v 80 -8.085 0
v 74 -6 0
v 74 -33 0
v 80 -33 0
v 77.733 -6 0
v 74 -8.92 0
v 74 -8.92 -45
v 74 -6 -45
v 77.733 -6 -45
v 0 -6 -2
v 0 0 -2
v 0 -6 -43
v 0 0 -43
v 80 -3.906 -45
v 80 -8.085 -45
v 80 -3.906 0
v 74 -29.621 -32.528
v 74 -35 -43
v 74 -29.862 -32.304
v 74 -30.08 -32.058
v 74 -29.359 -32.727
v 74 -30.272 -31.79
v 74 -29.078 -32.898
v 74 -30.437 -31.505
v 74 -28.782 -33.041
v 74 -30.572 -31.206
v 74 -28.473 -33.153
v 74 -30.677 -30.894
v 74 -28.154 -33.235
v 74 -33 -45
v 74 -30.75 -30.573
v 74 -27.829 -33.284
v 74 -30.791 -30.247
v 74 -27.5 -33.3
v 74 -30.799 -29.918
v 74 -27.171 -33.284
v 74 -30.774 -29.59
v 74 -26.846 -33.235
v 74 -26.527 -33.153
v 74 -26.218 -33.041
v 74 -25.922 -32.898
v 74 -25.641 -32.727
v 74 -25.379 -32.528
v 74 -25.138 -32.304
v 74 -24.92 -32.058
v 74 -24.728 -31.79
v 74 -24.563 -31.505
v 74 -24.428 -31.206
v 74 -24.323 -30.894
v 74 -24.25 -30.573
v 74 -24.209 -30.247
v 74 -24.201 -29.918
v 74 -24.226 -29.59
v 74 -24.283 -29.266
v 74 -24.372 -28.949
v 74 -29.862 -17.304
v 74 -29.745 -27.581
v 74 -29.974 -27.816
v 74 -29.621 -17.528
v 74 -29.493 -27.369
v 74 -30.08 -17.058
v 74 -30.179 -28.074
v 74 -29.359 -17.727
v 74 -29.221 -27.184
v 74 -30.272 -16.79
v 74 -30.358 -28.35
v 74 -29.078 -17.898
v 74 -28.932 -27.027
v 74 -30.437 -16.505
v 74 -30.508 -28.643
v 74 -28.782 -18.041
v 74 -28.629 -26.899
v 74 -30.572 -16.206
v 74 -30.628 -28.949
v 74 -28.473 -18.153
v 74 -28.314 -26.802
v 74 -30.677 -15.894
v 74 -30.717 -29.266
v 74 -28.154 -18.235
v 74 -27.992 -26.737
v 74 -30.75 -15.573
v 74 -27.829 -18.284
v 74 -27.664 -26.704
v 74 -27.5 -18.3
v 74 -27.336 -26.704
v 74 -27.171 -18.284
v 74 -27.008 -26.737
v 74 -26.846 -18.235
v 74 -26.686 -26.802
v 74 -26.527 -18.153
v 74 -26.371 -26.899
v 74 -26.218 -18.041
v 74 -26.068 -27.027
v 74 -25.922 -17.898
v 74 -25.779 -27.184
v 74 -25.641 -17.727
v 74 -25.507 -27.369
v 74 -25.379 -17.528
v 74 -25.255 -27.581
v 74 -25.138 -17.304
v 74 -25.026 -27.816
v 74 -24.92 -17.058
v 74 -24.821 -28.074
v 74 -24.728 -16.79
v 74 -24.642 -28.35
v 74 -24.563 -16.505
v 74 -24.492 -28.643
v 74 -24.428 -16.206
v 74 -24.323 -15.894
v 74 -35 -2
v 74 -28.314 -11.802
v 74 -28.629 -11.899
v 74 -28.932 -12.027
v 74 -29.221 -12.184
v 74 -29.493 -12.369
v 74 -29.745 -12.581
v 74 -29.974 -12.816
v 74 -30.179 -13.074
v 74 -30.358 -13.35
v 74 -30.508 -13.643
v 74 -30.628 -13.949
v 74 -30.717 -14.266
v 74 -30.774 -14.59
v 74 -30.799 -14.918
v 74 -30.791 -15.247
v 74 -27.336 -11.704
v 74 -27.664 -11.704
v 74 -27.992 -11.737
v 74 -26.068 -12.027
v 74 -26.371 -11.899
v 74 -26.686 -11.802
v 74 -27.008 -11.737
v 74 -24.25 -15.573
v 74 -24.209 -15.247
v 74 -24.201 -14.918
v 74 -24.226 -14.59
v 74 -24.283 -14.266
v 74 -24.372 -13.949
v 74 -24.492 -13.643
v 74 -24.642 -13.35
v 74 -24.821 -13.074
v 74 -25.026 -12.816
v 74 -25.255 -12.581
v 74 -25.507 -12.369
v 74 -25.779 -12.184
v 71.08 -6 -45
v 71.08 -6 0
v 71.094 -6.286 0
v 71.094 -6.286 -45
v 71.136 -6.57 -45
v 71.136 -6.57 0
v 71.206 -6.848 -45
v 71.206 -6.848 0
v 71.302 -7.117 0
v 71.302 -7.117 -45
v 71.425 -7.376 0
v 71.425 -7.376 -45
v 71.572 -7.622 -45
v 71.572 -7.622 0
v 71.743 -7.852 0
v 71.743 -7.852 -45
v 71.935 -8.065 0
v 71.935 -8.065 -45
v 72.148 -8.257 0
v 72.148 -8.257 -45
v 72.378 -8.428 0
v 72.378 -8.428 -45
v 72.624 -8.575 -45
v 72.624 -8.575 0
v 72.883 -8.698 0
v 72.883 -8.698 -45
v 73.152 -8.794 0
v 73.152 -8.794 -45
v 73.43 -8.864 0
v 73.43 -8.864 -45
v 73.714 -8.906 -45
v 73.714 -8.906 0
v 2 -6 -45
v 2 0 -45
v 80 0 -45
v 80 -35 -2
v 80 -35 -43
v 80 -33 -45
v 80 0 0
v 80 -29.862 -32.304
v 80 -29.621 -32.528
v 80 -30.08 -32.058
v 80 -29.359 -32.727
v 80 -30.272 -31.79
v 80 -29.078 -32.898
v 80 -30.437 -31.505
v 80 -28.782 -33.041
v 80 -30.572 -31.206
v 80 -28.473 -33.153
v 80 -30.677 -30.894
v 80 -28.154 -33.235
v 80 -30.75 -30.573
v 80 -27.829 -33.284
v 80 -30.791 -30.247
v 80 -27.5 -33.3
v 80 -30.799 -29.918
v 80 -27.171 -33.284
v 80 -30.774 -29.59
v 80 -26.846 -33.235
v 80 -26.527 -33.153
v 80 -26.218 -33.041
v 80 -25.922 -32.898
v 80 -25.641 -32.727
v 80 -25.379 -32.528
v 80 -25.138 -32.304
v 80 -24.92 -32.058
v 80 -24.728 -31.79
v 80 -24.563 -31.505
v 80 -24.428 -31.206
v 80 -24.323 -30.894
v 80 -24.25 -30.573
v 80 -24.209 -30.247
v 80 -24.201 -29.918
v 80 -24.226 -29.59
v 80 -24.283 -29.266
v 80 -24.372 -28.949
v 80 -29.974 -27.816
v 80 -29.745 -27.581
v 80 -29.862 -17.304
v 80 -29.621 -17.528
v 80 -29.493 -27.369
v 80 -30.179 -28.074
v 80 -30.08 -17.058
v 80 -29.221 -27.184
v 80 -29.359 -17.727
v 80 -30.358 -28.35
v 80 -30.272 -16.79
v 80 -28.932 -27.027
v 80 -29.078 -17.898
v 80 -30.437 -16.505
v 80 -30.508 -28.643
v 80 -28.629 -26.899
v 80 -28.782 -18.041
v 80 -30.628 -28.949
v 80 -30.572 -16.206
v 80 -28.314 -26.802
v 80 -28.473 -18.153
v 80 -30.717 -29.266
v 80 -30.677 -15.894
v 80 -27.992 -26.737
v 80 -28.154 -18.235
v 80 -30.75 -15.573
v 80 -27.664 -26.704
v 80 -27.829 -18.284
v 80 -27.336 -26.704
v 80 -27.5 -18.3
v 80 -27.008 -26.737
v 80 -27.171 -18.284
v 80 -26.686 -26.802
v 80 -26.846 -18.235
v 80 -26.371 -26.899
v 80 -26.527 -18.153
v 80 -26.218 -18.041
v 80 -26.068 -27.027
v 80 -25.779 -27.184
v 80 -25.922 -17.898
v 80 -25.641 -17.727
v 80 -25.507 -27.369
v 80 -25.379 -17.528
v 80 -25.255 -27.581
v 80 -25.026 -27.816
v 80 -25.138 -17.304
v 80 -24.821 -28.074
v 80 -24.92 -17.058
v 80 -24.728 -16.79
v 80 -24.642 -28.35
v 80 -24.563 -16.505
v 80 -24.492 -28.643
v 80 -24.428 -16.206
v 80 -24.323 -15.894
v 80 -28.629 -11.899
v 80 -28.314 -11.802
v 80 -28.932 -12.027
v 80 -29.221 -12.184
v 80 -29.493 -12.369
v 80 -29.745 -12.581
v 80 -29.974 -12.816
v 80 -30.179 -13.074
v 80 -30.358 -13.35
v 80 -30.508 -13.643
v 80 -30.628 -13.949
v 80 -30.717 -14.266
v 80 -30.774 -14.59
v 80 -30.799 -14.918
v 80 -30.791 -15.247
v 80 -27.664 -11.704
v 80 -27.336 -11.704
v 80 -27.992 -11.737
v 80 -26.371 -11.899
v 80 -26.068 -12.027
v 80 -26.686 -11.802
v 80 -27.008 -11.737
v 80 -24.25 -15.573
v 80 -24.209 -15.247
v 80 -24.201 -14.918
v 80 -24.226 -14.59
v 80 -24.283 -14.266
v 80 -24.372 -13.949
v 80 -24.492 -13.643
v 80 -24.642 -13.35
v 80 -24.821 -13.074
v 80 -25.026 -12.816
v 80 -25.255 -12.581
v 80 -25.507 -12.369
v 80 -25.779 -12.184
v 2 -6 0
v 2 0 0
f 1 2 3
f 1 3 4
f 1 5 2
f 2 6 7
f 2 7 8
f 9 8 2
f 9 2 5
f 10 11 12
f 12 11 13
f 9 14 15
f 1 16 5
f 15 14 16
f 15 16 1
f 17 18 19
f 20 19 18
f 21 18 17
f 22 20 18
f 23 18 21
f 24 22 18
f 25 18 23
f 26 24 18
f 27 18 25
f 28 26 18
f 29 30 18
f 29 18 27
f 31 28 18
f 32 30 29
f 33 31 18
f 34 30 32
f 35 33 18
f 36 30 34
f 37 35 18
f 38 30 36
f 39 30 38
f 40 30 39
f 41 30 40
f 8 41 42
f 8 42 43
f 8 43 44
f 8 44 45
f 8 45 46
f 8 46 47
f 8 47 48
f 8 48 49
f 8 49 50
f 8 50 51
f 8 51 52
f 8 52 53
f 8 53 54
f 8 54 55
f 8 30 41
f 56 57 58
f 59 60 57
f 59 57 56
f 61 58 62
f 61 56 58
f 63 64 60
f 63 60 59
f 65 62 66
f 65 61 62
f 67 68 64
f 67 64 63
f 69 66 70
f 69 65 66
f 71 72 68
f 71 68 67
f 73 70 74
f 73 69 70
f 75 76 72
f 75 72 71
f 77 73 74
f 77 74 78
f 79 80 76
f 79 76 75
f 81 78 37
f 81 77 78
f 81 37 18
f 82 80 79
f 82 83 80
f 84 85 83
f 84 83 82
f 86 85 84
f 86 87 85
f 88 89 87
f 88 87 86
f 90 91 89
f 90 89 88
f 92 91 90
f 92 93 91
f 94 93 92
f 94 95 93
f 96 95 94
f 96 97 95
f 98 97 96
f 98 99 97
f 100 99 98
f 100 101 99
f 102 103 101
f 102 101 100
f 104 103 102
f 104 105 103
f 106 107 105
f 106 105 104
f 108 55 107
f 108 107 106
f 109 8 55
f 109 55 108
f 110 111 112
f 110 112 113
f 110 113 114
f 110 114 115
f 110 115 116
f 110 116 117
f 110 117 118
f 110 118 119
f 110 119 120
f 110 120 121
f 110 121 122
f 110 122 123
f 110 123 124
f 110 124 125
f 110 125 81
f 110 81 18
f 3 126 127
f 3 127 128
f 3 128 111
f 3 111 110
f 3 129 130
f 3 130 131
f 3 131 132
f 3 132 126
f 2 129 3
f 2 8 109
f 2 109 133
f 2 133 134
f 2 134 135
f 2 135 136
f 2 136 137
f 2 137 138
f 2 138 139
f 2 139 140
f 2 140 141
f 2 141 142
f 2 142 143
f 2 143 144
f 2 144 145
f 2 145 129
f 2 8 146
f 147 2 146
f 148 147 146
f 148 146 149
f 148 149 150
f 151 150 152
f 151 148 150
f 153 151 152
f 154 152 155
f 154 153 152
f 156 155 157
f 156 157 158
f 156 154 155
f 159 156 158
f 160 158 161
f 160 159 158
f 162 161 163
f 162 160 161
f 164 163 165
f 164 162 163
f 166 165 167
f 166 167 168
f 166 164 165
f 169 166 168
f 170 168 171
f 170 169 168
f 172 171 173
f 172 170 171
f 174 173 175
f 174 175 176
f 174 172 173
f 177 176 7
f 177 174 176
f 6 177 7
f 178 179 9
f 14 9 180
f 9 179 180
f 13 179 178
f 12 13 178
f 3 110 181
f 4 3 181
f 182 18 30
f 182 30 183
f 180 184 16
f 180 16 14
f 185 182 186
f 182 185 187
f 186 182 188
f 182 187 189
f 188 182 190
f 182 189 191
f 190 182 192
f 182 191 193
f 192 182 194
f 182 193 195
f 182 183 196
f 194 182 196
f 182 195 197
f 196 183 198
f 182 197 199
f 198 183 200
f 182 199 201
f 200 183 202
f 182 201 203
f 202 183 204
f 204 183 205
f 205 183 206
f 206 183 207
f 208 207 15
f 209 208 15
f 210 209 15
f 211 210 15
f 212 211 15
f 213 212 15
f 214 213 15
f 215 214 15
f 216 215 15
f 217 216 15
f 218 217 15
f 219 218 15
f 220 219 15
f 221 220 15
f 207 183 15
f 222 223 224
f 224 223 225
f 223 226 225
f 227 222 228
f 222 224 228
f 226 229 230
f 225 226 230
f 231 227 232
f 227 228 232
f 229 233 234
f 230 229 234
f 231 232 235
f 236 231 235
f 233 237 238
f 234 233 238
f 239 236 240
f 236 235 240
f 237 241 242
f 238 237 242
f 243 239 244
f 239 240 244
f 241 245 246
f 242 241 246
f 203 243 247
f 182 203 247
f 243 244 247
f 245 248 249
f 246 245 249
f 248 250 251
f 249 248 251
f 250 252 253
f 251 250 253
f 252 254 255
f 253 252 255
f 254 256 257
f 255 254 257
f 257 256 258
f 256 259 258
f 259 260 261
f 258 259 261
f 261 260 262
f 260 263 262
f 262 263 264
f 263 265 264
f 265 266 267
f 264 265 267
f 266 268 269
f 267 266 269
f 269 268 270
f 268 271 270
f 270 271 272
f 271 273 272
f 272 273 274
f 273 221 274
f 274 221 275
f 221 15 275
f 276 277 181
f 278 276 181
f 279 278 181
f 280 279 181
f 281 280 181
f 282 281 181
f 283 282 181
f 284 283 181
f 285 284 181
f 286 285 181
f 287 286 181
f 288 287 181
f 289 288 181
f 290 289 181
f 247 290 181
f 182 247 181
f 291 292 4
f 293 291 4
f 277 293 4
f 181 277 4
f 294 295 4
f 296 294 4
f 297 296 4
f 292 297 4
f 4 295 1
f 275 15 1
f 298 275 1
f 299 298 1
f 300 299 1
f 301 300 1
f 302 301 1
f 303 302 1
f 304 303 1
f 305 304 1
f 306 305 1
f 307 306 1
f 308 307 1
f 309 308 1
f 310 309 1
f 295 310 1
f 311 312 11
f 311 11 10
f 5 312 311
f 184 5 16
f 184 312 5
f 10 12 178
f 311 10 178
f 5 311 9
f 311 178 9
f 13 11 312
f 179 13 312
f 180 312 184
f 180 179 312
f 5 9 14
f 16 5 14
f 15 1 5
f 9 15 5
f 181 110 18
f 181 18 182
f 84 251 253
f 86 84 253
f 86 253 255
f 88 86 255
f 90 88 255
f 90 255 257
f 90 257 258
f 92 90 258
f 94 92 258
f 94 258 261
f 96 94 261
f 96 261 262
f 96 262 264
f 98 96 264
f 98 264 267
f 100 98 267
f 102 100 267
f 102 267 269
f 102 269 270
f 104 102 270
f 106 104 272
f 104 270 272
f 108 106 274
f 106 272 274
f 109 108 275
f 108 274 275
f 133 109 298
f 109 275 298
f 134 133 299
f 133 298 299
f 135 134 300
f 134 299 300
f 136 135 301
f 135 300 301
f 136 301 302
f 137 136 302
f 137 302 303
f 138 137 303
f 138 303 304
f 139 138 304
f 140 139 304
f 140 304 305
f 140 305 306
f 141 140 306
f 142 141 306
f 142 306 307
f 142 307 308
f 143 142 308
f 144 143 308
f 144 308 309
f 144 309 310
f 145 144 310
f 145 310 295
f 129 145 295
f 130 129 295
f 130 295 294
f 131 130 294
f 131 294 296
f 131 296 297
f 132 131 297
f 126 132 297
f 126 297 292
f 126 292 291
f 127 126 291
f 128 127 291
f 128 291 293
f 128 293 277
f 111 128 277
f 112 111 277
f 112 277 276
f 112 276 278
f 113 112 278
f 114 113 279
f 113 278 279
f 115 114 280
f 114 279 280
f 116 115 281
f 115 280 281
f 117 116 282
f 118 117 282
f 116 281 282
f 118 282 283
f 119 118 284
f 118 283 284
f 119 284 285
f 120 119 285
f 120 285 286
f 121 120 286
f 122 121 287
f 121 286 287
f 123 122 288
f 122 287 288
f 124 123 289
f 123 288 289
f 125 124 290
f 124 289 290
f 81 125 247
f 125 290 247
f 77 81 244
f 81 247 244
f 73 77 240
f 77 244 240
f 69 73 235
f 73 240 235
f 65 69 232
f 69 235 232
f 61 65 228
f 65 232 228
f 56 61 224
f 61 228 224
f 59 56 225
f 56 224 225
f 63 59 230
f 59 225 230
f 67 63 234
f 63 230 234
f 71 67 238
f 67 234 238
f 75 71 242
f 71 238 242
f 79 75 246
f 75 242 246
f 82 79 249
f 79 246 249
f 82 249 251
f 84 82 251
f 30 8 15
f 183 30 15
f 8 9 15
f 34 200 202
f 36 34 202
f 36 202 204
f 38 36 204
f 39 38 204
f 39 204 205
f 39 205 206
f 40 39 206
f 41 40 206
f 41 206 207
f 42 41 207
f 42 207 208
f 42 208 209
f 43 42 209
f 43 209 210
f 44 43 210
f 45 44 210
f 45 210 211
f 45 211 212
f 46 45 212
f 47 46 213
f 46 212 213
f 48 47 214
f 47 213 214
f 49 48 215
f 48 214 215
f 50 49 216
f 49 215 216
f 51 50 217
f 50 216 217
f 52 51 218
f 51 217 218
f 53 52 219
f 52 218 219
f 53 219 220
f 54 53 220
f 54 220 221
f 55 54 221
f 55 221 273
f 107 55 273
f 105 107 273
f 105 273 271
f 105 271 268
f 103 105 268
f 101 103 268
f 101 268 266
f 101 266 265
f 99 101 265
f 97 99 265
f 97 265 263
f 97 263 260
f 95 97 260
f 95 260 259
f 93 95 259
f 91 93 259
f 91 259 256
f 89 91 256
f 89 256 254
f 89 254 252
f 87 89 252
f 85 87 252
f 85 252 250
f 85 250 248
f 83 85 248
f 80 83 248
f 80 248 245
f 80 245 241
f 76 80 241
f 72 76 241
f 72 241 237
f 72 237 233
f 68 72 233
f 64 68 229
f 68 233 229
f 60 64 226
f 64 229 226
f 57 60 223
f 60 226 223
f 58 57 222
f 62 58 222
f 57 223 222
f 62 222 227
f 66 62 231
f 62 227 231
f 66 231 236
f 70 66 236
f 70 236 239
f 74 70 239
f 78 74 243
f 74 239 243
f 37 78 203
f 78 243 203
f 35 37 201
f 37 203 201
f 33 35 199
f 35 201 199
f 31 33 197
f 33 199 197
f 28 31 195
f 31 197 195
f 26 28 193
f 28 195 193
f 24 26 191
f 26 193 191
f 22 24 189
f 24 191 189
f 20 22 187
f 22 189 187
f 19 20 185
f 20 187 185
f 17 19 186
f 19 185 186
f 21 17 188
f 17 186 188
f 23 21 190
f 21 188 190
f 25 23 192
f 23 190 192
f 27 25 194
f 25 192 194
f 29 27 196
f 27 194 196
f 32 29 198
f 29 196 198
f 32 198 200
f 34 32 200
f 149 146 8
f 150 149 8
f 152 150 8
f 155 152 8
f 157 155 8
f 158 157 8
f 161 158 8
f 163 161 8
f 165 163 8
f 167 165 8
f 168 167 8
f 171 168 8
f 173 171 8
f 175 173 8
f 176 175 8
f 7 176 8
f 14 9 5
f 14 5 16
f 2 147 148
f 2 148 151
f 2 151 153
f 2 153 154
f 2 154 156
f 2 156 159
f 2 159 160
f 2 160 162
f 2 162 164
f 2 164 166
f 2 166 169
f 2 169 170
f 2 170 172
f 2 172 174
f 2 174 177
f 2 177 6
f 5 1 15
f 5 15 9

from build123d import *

# Parameters (mm, degrees)
SKETCH1_W             = 80
SKETCH1_H             = 45
BOSS_EXTRUDE1_DEPTH   = 6
CHAMFER1_SIZE         = 2
SKETCH2_W             = 6
SKETCH2_H             = 45
BOSS_EXTRUDE2_DEPTH   = 29
CUT_EXTRUDE1_DEPTH    = 99.234413522
BOSS_EXTRUDE3_DEPTH   = 45
BOSS_EXTRUDE3_2_DEPTH = 45
SKETCH6_R             = 3.3
CUT_EXTRUDE2_DEPTH    = 99.234413522
CHAMFER2_SIZE         = 2


with BuildPart() as part:
    # Sketch1 → Boss-Extrude1 (new body)
    with BuildSketch(Plane(origin=(0, 0, 0), x_dir=(1, 0, 0), z_dir=(0, 1, 0))):
        with Locations((40, 22.5)):
            Rectangle(SKETCH1_W, SKETCH1_H)
    extrude(amount=-BOSS_EXTRUDE1_DEPTH)

    # Chamfer1
    chamfer1_edges = [part.edges().sort_by_distance(p)[0] for p in [
        (0, -3, -45),
        (0, -3, 0),
    ]]
    chamfer(chamfer1_edges, length=CHAMFER1_SIZE)


with BuildPart() as body_2:
    # Sketch2 → Boss-Extrude2 (new body)
    with BuildSketch(Plane.XZ.offset(6)):
        with Locations((77, -22.5)):
            Rectangle(SKETCH2_W, SKETCH2_H)
    extrude(amount=BOSS_EXTRUDE2_DEPTH)


with BuildPart() as cut_extrude1_tool:
    # Sketch4 → Cut-Extrude1 (new, through all)
    with BuildSketch(Plane.XY):
        with BuildLine():
            Line((74, -8.919882898), (74, -6))
            Line((74, -6), (71.080117102, -6))
            ThreePointArc((71.080117102, -6), (71.935331002, -8.064668998), (74, -8.919882898))
        make_face()
        Polygon((80, -3.906286882), (80, -8.085180387), (77.73284395, -6), align=None)
    extrude(amount=-CUT_EXTRUDE1_DEPTH)


with BuildPart() as part_1:
    add(part.part)

    # Cut-Extrude1: cut by cut_extrude1_tool
    add(cut_extrude1_tool.part, mode=Mode.SUBTRACT)


with BuildPart() as body_2_1:
    add(body_2.part)

    # Cut-Extrude1: cut by cut_extrude1_tool
    add(cut_extrude1_tool.part, mode=Mode.SUBTRACT)

    # Sketch6 → Cut-Extrude2 (cut, through all)
    with BuildSketch(Plane(origin=(80, 0, 0), x_dir=(0, 0, -1), z_dir=(1, 0, 0))):
        with Locations((15, -27.5)):
            Circle(SKETCH6_R)
        with Locations((30, -27.5)):
            Circle(SKETCH6_R)
    extrude(amount=-CUT_EXTRUDE2_DEPTH, mode=Mode.SUBTRACT)

    # Chamfer2
    chamfer2_edges = [body_2_1.edges().sort_by_distance(p)[0] for p in [
        (77, -35, -45),
        (77, -35, 0),
    ]]
    chamfer(chamfer2_edges, length=CHAMFER2_SIZE)


with BuildPart() as body_3:
    # Sketch4<2> → Boss-Extrude3 (new, through all)
    with BuildSketch(Plane.XY):
        with BuildLine():
            Line((74, -8.919882898), (74, -6))
            Line((74, -6), (71.080117102, -6))
            ThreePointArc((71.080117102, -6), (71.935331002, -8.064668998), (74, -8.919882898))
        make_face()
    extrude(amount=-BOSS_EXTRUDE3_DEPTH)


with BuildPart() as body_4:
    # Sketch4<2> → Boss-Extrude3 2 (new, through all)
    with BuildSketch(Plane.XY):
        Polygon((80, -3.906286882), (80, -8.085180387), (77.73284395, -6), align=None)
    extrude(amount=-BOSS_EXTRUDE3_2_DEPTH)


solid = Compound([part_1.part, body_2_1.part, body_3.part, body_4.part])
